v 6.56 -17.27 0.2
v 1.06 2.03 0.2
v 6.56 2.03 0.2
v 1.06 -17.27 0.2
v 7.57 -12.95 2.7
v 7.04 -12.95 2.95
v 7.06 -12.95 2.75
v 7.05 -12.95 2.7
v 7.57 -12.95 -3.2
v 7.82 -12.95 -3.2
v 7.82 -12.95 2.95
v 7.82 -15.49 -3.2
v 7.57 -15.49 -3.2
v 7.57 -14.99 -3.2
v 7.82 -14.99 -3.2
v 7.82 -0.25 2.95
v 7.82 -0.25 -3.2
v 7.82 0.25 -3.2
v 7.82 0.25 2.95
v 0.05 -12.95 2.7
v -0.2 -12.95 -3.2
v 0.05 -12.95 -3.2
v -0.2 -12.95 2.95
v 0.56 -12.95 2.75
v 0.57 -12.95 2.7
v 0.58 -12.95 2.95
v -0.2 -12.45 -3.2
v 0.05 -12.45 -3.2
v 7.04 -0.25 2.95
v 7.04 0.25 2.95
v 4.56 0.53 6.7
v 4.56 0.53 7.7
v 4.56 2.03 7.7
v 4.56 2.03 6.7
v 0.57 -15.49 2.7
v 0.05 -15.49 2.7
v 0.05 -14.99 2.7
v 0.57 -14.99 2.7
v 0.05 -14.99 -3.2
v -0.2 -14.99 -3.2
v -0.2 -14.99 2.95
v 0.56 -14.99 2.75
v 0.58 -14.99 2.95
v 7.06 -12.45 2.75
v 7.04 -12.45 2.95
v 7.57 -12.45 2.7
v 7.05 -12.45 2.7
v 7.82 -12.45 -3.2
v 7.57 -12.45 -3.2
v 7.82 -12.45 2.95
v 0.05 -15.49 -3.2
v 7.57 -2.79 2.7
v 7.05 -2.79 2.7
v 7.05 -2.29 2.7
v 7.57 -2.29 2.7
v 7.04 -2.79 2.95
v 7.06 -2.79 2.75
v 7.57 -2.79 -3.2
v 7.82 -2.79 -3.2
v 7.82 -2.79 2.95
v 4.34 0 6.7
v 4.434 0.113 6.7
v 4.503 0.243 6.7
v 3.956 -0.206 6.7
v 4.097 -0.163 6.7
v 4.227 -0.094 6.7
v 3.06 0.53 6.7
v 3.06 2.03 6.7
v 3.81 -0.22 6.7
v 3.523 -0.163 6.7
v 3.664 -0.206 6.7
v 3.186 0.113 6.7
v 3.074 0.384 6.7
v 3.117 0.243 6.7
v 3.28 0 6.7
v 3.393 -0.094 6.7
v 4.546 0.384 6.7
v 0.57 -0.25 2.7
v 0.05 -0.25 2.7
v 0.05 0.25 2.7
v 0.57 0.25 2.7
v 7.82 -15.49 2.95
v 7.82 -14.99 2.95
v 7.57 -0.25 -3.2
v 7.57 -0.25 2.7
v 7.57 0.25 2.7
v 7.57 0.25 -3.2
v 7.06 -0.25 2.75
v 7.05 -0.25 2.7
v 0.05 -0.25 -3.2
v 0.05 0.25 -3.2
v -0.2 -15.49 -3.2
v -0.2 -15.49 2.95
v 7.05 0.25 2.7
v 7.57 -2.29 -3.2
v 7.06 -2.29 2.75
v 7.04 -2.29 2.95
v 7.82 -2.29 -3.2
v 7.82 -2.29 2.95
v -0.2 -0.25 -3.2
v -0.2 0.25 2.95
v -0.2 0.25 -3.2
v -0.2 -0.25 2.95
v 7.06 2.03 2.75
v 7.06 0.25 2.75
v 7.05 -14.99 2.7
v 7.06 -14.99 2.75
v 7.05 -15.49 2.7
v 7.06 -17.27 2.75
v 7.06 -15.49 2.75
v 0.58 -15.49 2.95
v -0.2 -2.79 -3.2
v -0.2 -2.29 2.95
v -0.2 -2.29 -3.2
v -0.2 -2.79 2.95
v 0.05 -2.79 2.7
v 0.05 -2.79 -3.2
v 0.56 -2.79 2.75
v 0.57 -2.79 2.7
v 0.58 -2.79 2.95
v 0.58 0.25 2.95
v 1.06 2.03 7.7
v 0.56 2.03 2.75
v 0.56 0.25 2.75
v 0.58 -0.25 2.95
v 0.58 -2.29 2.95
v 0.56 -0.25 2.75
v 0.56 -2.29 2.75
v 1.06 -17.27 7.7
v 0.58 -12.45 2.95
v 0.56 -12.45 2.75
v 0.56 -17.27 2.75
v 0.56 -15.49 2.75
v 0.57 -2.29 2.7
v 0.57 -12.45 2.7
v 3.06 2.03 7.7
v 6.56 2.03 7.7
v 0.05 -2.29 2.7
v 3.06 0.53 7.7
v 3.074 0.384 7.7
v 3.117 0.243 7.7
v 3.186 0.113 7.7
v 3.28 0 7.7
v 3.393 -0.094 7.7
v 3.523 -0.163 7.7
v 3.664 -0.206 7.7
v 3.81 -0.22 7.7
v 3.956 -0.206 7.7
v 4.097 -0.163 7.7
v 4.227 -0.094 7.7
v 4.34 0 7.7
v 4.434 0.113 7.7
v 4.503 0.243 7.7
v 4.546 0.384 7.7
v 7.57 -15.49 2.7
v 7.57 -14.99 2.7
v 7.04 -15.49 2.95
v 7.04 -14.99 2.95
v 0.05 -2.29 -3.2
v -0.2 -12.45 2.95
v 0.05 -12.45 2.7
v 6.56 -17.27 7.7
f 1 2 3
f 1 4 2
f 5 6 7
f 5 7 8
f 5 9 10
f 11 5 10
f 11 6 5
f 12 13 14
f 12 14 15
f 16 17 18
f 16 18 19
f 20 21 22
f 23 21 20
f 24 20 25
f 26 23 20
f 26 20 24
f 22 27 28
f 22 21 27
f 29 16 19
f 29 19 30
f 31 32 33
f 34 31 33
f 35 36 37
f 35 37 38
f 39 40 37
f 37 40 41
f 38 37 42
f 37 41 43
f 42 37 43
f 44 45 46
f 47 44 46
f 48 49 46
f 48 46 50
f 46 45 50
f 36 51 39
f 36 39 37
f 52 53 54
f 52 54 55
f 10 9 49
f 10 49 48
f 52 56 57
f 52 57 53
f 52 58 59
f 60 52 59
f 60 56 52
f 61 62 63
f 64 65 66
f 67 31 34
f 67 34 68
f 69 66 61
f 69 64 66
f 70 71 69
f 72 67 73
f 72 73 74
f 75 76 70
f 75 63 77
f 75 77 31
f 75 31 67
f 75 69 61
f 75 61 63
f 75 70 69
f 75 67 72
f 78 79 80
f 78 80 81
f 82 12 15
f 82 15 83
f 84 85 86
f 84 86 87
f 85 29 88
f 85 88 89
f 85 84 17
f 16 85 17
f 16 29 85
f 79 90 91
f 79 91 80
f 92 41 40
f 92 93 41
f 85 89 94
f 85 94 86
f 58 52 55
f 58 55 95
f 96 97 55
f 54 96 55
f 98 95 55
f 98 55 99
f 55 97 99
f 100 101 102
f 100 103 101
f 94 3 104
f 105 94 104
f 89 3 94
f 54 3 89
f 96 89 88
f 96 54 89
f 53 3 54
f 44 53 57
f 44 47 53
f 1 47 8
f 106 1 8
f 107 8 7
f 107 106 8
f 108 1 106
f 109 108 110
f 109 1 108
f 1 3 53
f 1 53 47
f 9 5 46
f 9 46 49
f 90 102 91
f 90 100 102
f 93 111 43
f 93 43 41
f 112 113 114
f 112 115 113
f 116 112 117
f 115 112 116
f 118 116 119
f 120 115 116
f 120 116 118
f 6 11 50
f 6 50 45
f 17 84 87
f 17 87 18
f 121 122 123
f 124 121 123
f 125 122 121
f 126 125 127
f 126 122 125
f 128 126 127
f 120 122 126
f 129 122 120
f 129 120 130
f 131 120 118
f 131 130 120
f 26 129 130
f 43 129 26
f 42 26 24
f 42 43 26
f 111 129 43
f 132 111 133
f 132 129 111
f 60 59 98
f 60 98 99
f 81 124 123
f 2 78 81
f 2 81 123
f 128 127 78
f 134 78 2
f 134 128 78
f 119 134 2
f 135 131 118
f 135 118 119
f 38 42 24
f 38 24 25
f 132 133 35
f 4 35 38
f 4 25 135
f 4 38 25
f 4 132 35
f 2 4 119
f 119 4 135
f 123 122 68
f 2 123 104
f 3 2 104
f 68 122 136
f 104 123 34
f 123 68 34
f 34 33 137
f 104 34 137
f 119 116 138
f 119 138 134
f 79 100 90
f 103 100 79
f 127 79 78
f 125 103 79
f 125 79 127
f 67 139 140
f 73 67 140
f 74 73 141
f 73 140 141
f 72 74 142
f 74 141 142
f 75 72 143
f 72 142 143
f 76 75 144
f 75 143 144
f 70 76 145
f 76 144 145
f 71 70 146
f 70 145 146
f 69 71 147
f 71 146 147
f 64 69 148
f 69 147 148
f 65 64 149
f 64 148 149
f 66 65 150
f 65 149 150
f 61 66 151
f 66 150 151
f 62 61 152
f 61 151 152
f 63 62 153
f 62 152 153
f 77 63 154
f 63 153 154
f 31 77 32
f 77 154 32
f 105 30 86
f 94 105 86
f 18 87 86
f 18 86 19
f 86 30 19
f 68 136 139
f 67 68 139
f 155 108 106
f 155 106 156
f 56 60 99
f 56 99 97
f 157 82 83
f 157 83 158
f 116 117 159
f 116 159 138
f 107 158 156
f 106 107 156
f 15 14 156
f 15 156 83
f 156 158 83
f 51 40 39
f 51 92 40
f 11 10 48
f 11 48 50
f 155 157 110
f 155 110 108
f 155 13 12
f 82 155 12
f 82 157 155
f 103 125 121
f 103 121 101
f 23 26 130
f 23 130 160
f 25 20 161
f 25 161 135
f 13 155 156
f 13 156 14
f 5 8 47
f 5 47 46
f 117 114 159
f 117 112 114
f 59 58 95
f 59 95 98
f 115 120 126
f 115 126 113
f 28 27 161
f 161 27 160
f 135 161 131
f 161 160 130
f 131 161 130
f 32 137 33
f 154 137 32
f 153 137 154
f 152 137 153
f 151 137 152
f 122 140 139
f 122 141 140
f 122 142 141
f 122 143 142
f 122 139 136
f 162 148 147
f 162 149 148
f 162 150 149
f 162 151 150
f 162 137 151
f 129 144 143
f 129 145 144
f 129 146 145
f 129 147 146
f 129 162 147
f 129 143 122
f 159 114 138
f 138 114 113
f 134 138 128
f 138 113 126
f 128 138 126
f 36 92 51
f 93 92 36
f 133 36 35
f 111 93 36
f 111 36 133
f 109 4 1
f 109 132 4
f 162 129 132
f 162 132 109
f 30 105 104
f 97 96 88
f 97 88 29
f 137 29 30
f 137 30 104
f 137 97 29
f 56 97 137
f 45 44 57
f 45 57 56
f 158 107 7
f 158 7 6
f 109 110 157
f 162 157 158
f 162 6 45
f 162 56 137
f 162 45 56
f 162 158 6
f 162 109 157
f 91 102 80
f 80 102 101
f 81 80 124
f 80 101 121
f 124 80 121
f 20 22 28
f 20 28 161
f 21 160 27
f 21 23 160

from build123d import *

# Parameters (mm, degrees)
PAD003_DEPTH = 0.25
PAD_DEPTH    = 9.65
POCKET_DEPTH = 1
PAD002_DEPTH = 0.25
PAD001_DEPTH = 0.25
PAD004_DEPTH = 0.25


with BuildPart() as pad003:
    # Sketch004 → Pad003 (new body, symmetric)
    with BuildSketch(Plane.XZ.offset(2.54)):
        Polygon((-0.2, -3.2), (0.05, -3.2), (0.05, 2.7), (7.57, 2.7), (7.57, -3.2), (7.82, -3.2), (7.82, 2.95), (-0.2, 2.95), align=None)
    extrude(amount=PAD003_DEPTH, both=True)


with BuildPart() as pocket:
    # Sketch → Pad (new body, symmetric)
    with BuildSketch(Plane.XZ.offset(7.62)):
        Polygon((1.06, 0.2), (6.56, 0.2), (7.06, 2.75), (6.56, 7.7), (1.06, 7.7), (0.56, 2.75), align=None)
    extrude(amount=PAD_DEPTH, both=True)

    # Sketch003 → Pocket (cut)
    with BuildSketch(Plane(origin=(0, -7.62, 7.7), x_dir=(-1, 0, 0), z_dir=(0, 0, 1))):
        with BuildLine():
            ThreePointArc((-3.06, -8.15), (-3.81, -7.4), (-4.56, -8.15))
            Line((-4.56, -8.15), (-4.56, -9.65))
            Line((-4.56, -9.65), (-3.06, -9.65))
            Line((-3.06, -9.65), (-3.06, -8.15))
        make_face()
    extrude(amount=-POCKET_DEPTH, mode=Mode.SUBTRACT)


with BuildPart() as pad002:
    # Sketch002 → Pad002 (new body, symmetric)
    with BuildSketch(Plane.XZ.offset(15.24)):
        Polygon((-0.2, -3.2), (0.05, -3.2), (0.05, 2.7), (7.57, 2.7), (7.57, -3.2), (7.82, -3.2), (7.82, 2.95), (-0.2, 2.95), align=None)
    extrude(amount=PAD002_DEPTH, both=True)


with BuildPart() as pad001:
    # Sketch001 → Pad001 (new body, symmetric)
    with BuildSketch(Plane.XZ):
        Polygon((-0.2, -3.2), (0.05, -3.2), (0.05, 2.7), (7.57, 2.7), (7.57, -3.2), (7.82, -3.2), (7.82, 2.95), (-0.2, 2.95), align=None)
    extrude(amount=PAD001_DEPTH, both=True)


with BuildPart() as relay_standexmeder_dip_highprofile:
    # Sketch005 → Pad004 (new body, symmetric)
    with BuildSketch(Plane.XZ.offset(12.7)):
        Polygon((-0.2, -3.2), (0.05, -3.2), (0.05, 2.7), (7.57, 2.7), (7.57, -3.2), (7.82, -3.2), (7.82, 2.95), (-0.2, 2.95), align=None)
    extrude(amount=PAD004_DEPTH, both=True)

    # Pad004_mp_cp: union Pad003, Pocket, Pad002, Pad001
    add(pad003.part)
    add(pocket.part)
    add(pad002.part)
    add(pad001.part)


solid = relay_standexmeder_dip_highprofile.part
